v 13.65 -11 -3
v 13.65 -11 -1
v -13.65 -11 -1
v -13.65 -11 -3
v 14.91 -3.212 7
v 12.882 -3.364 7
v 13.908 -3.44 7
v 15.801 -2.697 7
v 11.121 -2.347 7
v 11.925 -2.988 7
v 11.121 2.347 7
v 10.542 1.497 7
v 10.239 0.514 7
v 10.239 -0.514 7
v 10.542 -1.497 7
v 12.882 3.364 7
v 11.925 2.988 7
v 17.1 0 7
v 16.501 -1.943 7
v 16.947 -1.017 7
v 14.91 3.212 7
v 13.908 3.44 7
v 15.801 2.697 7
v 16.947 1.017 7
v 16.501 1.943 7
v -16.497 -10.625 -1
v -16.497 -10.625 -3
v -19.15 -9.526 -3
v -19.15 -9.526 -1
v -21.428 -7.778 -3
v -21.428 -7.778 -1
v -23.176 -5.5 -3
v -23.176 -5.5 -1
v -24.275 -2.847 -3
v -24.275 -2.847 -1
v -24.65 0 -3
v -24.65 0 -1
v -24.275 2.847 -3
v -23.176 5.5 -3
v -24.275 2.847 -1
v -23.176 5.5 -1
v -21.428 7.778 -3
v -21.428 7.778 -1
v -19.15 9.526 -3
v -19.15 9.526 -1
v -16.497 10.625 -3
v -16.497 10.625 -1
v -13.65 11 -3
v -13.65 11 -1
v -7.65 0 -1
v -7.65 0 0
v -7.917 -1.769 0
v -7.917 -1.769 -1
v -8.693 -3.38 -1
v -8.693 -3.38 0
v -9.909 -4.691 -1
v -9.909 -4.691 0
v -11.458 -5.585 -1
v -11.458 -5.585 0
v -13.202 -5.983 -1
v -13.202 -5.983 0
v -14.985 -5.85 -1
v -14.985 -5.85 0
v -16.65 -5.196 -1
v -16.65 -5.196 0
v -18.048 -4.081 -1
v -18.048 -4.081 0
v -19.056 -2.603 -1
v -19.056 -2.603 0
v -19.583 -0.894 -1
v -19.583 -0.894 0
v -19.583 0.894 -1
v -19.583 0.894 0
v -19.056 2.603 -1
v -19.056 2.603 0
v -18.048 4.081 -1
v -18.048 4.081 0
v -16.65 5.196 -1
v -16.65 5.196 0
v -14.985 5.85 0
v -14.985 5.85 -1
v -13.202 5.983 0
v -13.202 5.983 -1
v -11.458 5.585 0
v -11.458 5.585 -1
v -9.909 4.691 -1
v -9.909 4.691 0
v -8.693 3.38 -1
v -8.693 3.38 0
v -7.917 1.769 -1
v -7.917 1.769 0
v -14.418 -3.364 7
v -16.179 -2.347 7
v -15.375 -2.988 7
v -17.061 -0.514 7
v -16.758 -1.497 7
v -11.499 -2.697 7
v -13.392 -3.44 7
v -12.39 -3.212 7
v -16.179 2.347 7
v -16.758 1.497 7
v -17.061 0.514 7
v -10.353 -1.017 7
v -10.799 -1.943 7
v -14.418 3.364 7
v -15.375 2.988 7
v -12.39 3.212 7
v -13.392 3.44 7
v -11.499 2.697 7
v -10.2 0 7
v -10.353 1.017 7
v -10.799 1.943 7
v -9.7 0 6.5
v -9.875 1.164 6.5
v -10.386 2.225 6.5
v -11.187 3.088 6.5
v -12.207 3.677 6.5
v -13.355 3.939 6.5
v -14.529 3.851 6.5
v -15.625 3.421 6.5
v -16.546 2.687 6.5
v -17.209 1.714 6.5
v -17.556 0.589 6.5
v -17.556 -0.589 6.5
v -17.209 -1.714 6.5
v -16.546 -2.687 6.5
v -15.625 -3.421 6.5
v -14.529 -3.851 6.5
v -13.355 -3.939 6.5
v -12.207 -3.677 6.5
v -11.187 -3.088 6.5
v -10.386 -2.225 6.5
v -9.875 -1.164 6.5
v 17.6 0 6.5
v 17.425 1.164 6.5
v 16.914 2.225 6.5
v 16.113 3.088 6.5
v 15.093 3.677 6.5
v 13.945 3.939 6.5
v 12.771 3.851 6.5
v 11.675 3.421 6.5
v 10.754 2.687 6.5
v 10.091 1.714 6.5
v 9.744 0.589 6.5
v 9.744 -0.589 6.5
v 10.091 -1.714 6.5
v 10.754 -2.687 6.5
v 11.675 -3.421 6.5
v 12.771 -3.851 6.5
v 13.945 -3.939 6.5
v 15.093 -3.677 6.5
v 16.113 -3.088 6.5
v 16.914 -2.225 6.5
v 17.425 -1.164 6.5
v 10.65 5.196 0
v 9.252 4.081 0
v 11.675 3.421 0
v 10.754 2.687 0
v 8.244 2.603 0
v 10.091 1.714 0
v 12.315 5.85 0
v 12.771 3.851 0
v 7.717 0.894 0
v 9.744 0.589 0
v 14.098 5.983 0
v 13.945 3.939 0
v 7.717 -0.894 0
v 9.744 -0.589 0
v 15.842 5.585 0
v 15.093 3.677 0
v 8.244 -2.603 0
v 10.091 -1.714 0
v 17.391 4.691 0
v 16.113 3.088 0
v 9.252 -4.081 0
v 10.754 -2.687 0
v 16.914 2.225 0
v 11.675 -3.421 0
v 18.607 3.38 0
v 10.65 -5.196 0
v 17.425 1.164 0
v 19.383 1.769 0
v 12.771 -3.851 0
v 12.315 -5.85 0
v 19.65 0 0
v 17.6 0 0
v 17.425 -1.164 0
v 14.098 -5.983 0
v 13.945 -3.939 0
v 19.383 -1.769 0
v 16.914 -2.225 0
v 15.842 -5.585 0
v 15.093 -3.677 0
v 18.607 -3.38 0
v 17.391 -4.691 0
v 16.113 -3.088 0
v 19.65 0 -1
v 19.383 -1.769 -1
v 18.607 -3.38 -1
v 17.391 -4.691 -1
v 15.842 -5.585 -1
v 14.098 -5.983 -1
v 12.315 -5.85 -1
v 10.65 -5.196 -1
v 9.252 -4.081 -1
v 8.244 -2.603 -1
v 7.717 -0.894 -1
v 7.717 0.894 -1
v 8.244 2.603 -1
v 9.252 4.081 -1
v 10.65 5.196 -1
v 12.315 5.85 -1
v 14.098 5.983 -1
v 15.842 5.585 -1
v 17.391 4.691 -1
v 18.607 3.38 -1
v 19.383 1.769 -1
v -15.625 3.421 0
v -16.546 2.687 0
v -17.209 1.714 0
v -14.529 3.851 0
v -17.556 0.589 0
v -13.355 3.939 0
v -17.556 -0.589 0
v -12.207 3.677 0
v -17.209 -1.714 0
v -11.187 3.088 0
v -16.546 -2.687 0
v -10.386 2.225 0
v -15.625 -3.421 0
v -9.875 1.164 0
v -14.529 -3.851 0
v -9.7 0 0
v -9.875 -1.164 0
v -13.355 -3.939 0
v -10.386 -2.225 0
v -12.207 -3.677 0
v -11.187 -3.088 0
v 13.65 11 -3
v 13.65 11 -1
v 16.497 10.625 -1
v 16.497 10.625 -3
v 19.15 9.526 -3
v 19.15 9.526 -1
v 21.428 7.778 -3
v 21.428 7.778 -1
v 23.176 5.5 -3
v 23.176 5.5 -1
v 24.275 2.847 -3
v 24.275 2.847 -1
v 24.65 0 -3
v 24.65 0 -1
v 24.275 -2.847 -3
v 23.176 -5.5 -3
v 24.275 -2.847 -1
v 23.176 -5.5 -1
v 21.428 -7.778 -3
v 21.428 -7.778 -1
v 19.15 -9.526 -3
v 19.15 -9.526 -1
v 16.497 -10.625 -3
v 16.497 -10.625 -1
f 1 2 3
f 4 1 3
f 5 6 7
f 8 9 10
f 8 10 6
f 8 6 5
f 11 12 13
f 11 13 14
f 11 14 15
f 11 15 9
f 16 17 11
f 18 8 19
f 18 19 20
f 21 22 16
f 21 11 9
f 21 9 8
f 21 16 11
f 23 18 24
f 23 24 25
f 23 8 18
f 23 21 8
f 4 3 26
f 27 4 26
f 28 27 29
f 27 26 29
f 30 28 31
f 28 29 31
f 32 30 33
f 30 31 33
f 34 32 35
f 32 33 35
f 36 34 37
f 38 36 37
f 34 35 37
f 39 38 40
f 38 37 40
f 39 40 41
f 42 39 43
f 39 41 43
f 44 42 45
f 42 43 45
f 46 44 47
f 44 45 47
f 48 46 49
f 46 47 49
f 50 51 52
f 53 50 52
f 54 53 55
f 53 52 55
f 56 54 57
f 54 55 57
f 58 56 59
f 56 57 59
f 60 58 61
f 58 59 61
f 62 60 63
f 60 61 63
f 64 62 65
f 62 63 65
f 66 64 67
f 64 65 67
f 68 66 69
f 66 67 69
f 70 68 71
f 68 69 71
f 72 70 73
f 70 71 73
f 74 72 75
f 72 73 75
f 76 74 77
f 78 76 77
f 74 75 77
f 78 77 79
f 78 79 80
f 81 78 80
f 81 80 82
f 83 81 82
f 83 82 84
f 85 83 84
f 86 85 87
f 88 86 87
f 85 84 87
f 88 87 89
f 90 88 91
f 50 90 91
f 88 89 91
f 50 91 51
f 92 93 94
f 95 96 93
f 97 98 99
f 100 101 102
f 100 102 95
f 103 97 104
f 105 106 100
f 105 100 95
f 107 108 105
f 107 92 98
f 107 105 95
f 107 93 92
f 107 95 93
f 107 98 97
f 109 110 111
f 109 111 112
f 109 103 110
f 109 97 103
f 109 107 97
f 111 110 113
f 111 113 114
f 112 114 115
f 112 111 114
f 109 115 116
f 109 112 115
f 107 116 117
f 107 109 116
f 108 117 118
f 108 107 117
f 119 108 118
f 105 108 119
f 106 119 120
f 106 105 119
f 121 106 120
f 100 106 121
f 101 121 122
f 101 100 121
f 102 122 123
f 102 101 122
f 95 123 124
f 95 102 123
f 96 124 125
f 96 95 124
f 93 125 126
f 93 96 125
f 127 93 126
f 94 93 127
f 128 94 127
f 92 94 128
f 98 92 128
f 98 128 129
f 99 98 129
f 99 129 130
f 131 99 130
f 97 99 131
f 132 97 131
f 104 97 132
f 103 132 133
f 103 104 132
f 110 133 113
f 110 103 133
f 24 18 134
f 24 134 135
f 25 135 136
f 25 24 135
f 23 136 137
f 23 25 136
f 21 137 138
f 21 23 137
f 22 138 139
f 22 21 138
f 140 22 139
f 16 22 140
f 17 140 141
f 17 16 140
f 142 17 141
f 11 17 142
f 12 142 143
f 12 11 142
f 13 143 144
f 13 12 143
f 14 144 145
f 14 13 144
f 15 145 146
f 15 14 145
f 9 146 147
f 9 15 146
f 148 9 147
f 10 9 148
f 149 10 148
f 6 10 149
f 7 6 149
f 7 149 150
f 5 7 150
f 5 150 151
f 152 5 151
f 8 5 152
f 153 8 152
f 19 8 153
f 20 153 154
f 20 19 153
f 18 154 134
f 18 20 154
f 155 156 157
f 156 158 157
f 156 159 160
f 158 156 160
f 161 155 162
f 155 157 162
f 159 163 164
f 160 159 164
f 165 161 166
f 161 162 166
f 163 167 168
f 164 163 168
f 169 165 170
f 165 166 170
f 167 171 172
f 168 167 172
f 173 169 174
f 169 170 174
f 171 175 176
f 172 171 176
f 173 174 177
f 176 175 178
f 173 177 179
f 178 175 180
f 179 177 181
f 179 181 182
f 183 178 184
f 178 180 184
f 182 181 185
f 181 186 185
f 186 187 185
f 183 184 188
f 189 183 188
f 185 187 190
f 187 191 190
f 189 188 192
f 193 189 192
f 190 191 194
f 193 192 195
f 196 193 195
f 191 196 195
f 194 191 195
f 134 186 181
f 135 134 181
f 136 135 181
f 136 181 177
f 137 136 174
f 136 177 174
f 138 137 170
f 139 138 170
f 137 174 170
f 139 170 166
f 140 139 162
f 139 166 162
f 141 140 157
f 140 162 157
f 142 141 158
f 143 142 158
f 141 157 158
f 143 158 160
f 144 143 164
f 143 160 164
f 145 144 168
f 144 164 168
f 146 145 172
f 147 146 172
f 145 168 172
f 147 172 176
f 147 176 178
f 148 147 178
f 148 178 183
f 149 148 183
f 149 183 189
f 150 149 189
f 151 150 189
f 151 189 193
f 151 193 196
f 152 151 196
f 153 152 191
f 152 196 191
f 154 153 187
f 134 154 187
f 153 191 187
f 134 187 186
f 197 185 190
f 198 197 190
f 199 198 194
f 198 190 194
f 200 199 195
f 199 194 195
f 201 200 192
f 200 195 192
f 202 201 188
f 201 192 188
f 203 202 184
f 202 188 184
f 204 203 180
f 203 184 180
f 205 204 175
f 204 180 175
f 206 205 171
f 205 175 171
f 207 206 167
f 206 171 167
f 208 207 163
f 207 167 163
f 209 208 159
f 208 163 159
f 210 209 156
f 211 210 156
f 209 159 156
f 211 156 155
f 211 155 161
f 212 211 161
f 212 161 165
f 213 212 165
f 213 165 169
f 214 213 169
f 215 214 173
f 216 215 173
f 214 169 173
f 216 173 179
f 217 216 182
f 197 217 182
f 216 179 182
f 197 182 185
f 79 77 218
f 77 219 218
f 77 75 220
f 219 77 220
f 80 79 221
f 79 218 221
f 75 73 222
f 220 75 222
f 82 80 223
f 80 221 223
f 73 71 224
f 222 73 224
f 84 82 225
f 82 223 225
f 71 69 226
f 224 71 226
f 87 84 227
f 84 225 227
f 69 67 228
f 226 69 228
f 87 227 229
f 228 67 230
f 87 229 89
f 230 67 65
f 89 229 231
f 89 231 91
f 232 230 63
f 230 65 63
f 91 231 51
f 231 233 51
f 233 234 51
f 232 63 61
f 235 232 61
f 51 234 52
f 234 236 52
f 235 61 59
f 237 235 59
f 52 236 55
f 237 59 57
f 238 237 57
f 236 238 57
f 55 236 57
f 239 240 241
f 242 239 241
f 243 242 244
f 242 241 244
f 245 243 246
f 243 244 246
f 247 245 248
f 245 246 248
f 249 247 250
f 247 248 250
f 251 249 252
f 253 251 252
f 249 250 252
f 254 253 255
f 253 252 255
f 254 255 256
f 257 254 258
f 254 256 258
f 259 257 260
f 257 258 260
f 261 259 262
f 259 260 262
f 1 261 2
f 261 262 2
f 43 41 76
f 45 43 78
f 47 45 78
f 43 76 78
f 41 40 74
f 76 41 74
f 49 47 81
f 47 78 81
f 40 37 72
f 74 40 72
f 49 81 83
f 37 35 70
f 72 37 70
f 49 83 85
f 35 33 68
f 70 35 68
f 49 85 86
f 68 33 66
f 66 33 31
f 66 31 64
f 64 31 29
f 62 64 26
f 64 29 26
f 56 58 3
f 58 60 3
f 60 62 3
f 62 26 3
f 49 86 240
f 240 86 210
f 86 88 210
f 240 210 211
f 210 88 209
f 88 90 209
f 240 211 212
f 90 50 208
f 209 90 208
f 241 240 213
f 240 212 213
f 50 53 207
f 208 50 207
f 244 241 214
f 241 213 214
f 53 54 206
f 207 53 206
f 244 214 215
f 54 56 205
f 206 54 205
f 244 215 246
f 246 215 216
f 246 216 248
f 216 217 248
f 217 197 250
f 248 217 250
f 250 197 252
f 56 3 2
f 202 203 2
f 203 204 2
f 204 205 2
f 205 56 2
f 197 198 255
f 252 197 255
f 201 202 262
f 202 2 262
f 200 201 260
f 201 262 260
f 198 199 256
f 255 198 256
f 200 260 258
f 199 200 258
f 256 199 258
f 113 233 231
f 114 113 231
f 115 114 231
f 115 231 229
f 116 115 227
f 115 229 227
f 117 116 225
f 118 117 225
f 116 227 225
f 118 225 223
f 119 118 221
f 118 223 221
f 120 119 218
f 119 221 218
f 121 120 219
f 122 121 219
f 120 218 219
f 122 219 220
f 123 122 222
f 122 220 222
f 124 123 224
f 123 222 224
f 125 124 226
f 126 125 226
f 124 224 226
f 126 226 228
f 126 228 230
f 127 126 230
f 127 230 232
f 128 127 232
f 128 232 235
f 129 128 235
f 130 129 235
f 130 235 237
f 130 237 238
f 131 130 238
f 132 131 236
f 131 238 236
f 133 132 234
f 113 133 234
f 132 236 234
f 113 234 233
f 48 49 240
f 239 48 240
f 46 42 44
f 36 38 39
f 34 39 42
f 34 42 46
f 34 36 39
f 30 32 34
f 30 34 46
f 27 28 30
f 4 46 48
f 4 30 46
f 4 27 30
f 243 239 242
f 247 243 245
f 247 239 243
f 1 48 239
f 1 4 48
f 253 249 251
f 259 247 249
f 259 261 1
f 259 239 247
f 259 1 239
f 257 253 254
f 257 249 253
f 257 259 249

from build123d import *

# Parameters (mm, degrees)
F1_R     = 3.95
F2_DEPTH = 7
F3_R     = 6
F4_DEPTH = 1
F6_DEPTH = 2
F7_SIZE  = 0.5


with BuildPart() as f2:
    # F1 (on Top) → F2 (new body)
    with BuildSketch(Plane.XY):
        with Locations((-13.65, 0)):
            Circle(F1_R)
        with Locations((13.65, 0)):
            Circle(F1_R)
    extrude(amount=F2_DEPTH)

    # F3 (on face) → F4 (join)
    with BuildSketch(Plane(origin=(0, 0, 0), x_dir=(1, 0, 0), z_dir=(0, 0, -1))):
        with Locations((13.65, 0)):
            Circle(F3_R)
        with Locations((-13.65, 0)):
            Circle(F3_R)
    extrude(amount=F4_DEPTH)

    # F5 (on face) → F6 (join)
    with BuildSketch(Plane(origin=(0, 0, -1), x_dir=(1, 0, 0), z_dir=(0, 0, -1))):
        with BuildLine():
            ThreePointArc((-13.65, 11), (-24.65, 0), (-13.65, -11))
            Line((-13.65, -11), (13.65, -11))
            ThreePointArc((13.65, -11), (24.65, 0), (13.65, 11))
            Line((13.65, 11), (-13.65, 11))
        make_face()
    extrude(amount=F6_DEPTH)

    # F7
    f7_edges = [f2.edges().sort_by_distance(p)[0] for p in [
        (-17.6, 0, 7),
        (9.7, 0, 7),
    ]]
    chamfer(f7_edges, length=F7_SIZE)


solid = f2.part
